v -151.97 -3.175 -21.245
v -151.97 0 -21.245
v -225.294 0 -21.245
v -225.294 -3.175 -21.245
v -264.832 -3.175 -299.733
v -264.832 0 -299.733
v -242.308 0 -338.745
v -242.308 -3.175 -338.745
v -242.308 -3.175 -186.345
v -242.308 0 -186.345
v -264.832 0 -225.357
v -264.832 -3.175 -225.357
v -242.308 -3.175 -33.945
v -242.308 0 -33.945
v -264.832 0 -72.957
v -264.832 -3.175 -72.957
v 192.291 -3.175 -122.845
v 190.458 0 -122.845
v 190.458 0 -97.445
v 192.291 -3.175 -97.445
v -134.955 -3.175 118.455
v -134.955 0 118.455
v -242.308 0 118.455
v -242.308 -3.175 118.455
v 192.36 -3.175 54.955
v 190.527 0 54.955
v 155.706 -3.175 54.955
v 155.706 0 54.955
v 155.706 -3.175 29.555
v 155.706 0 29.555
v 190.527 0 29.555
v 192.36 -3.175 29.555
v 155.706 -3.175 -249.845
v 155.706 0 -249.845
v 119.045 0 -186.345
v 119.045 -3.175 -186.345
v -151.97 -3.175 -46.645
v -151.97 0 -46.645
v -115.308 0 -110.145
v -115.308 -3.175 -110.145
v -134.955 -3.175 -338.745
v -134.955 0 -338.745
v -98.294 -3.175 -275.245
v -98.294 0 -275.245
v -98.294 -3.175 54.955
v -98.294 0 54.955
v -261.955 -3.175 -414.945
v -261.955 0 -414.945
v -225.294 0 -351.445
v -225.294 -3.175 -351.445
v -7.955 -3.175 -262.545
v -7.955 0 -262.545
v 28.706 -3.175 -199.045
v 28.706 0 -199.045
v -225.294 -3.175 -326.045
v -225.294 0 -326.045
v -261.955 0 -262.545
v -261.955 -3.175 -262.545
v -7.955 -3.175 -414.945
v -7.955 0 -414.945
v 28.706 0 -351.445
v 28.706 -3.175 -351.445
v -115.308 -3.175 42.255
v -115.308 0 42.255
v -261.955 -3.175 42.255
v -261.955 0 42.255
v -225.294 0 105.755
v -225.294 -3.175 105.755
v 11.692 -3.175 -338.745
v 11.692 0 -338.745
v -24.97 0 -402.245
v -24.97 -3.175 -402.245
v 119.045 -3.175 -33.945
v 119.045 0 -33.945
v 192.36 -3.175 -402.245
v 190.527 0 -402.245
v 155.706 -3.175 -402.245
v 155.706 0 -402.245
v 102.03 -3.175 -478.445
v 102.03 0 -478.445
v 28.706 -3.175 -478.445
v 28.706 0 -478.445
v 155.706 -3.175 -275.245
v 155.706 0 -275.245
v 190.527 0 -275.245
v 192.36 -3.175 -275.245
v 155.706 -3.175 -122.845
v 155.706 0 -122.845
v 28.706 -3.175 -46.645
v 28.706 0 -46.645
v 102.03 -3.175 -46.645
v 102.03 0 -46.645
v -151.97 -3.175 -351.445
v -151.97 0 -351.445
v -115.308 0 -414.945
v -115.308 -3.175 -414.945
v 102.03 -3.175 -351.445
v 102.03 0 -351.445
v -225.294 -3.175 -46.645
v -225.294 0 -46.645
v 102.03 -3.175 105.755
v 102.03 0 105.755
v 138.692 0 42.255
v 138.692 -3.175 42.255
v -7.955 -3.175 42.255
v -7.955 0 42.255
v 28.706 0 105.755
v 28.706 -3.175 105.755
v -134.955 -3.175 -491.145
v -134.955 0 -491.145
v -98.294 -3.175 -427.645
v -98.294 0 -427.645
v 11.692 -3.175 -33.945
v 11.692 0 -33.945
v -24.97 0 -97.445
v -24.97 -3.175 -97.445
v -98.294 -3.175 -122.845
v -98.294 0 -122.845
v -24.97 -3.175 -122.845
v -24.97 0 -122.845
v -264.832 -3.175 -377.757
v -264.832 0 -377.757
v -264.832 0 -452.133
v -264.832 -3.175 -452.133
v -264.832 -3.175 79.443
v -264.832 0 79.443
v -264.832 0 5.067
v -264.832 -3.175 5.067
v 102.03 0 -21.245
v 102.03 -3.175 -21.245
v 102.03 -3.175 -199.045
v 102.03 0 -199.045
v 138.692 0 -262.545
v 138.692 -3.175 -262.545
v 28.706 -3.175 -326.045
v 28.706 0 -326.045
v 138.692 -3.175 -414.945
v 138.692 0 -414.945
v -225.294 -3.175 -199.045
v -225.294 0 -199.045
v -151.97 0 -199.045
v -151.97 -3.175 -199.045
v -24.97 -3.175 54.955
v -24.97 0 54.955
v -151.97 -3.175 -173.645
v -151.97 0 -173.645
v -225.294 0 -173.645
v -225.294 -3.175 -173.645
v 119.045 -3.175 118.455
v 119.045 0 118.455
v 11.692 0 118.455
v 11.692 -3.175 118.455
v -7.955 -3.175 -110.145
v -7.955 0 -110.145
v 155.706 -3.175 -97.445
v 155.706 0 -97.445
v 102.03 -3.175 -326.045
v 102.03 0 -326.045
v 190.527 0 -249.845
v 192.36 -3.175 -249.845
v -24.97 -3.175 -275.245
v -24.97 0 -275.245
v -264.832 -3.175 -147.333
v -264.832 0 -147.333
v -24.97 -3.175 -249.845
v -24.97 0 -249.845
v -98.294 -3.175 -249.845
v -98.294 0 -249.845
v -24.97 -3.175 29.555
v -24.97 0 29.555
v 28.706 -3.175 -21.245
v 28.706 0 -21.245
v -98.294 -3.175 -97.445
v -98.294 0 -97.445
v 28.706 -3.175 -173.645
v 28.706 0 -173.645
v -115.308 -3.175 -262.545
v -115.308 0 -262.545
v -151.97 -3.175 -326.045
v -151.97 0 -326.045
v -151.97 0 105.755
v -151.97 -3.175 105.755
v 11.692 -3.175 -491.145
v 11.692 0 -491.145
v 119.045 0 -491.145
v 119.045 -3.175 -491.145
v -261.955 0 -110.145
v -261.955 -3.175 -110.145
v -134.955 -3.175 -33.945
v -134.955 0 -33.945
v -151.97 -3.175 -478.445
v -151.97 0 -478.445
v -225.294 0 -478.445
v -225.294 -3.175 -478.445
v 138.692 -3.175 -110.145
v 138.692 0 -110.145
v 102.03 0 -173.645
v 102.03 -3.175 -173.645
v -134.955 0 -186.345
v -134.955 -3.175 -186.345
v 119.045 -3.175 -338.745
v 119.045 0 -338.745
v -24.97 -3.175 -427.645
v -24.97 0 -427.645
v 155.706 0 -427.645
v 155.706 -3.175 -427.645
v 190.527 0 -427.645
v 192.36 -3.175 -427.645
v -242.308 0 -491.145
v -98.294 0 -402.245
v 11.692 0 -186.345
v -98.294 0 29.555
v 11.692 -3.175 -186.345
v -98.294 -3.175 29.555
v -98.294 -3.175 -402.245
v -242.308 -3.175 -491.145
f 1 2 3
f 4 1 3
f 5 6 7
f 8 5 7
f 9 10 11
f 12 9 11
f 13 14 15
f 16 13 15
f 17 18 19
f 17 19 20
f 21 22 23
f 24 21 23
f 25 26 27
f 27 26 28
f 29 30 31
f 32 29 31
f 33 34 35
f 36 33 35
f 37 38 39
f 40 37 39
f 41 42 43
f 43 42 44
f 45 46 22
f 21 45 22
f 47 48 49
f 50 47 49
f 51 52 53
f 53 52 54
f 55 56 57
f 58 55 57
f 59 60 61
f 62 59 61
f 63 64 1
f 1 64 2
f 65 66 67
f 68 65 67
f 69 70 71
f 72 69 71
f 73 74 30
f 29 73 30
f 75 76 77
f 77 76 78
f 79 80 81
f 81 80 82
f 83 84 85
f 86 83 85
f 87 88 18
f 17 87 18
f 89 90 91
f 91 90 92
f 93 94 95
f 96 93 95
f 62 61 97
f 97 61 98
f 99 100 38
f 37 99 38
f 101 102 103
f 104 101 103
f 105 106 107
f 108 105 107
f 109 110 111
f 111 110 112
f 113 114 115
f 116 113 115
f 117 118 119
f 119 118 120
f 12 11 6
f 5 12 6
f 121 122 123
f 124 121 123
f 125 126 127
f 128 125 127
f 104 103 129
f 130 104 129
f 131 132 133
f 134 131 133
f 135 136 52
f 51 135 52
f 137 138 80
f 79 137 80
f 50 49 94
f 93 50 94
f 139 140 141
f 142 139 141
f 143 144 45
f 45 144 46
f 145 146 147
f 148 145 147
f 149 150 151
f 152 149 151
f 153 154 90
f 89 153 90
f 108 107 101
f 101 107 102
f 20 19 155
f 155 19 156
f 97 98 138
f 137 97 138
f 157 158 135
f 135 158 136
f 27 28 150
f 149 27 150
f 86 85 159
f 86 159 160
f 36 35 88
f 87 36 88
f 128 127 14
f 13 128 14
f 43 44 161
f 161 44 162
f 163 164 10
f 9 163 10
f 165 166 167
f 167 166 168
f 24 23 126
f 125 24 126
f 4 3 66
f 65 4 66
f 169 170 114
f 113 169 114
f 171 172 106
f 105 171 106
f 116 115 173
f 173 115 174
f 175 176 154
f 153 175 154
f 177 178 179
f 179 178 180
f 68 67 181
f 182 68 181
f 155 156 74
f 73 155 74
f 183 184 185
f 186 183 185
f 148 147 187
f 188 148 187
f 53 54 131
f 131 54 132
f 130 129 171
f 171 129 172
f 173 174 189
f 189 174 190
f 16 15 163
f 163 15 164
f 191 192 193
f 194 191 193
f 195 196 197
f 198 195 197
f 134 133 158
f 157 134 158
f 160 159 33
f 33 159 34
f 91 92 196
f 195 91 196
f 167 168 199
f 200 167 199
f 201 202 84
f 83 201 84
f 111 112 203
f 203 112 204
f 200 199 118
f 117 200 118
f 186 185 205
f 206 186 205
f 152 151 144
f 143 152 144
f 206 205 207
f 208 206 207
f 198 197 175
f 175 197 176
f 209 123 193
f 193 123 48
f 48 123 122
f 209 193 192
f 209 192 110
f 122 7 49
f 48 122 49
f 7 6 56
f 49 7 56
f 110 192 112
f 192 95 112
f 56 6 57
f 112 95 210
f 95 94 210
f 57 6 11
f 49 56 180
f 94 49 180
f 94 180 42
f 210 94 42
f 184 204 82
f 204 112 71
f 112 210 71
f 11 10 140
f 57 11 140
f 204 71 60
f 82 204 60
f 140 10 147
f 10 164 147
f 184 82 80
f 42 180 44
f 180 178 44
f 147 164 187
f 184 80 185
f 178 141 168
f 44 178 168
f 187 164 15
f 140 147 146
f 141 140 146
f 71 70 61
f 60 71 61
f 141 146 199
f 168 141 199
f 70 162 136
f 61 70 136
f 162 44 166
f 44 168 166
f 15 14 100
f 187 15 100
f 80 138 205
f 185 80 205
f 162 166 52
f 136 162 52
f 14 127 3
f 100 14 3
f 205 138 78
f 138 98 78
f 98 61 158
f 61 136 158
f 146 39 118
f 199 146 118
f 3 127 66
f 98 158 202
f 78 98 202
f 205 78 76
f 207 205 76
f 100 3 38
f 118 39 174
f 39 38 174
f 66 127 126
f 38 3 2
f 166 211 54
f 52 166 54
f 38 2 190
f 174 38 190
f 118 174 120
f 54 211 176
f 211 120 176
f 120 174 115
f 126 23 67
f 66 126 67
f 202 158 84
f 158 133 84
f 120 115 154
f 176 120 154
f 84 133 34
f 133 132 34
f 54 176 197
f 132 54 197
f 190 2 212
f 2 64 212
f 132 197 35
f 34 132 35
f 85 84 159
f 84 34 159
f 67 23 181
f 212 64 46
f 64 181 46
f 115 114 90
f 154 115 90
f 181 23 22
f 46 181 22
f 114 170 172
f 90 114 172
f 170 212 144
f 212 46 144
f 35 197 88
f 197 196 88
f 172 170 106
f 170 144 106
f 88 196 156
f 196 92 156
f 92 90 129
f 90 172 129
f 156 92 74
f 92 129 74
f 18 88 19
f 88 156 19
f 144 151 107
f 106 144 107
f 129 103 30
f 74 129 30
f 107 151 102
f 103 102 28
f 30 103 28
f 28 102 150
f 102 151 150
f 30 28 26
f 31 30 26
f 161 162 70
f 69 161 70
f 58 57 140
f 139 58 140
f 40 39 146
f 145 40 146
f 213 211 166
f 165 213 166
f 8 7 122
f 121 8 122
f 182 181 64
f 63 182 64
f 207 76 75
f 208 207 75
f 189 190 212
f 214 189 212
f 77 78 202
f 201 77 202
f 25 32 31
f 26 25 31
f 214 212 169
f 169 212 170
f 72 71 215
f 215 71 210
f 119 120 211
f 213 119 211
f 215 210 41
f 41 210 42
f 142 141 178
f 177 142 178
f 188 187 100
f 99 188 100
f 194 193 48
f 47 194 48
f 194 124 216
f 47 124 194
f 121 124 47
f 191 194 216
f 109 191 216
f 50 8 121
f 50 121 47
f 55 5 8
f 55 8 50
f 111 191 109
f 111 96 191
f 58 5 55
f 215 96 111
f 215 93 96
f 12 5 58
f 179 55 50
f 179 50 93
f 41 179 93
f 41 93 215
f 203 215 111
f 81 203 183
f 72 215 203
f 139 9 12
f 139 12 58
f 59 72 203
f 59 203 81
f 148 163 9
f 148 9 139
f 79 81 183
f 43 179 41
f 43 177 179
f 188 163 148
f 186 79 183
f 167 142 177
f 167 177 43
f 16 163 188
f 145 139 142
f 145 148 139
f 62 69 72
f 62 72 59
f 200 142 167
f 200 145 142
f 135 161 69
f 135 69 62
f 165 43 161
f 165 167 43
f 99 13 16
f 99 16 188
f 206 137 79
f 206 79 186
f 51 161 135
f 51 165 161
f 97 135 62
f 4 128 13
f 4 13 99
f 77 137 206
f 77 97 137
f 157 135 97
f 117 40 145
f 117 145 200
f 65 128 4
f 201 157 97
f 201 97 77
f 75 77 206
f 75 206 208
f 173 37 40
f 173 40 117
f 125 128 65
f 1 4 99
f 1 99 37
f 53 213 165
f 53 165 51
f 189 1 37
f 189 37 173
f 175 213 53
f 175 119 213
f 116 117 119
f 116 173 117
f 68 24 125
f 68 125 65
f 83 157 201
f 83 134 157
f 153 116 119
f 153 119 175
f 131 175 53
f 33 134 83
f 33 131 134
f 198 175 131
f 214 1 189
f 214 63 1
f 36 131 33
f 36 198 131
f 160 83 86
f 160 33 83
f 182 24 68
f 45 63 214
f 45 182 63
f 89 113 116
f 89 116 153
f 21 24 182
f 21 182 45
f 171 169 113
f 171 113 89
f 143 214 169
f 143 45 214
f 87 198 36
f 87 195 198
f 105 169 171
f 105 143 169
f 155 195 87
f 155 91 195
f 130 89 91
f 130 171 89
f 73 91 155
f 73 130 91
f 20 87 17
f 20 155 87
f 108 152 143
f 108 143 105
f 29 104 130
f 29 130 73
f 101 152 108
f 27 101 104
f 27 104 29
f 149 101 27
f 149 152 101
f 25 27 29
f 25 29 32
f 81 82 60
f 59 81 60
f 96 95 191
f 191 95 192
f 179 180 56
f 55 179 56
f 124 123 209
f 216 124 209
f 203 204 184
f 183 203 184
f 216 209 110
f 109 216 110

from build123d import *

# Parameters (mm, degrees)
F1_DEPTH    = 3.175
F2_T1_DEPTH = 41.9033921872
F3_T1_DEPTH = 42.5180012054
F4_T1_DEPTH = 41.9033921872
F5_T1_DEPTH = 41.9033921872


# Not quite as in the source:
# - a fillet or chamfer that OpenCascade refuses, or shapes differently, is made with other operations: its cross-section is extruded or revolved along the edge and cut away or added
# - ends of sketch curves that miss each other by under 0.0002 mm in the source are joined


with BuildPart() as f1:
    # F0 (on Front) → F1 (new body)
    with BuildSketch(Plane.XZ):
        Polygon((-134.9552678654, 118.4551059571), (-242.3083075974, 118.4551059571), (-264.8317917845, 79.4432945156), (-264.8317917845, 5.0669305831), (-242.3083075974, -33.9448883924), (-264.8317917845, -72.9567073679), (-264.8317917845, -147.3330713004), (-242.3083075974, -186.3448902759), (-264.8317917845, -225.3567092514), (-264.8317917845, -299.7330731839), (-242.3083075974, -338.7448921594), (-264.8317917845, -377.7567111349), (-264.8317917845, -452.1330750674), (-242.3083075974, -491.1448940429), (-134.9552678654, -491.1448940429), (-98.2935257718, -427.6448940429), (-24.9700415847, -427.6448940429), (11.6917005088, -491.1448940429), (119.0447402409, -491.1448940429), (155.7064823344, -427.6448940429), (192.3682082155, -427.6448940429), (192.3682082155, -402.2448921594), (155.7064823344, -402.2448921594), (119.0447402409, -338.7448921594), (155.7064823344, -275.2448921594), (192.3682082155, -275.2448921594), (192.3682082155, -249.8448902759), (155.7064823344, -249.8448902759), (119.0447402409, -186.3448902759), (155.7064823344, -122.8448902759), (192.3682082155, -122.8448902759), (192.3682082155, -97.4448883924), (155.7064823344, -97.4448883924), (119.0447402409, -33.9448883924), (155.7064823344, 29.5551116076), (192.3682082155, 29.5551116076), (192.3682082155, 54.9551134911), (155.7064823344, 54.9551134911), (119.0447402409, 118.4551134911), (11.6917005088, 118.4551059571), (-24.9700415847, 54.9551134911), (-98.2935257718, 54.9551134911), align=None)
        Polygon((-261.9552759716, -414.9448940429), (-225.2935338781, -351.4448940429), (-151.970049691, -351.4448940429), (-115.3083075974, -414.9448940429), (-151.970049691, -478.4448940429), (-225.2935338781, -478.4448940429), align=None, mode=Mode.SUBTRACT)
        Polygon((11.6917005088, -338.7448921594), (-24.9700415847, -402.2448921594), (-98.2935257718, -402.2448921594), (-134.9552678654, -338.7448921594), (-98.2935257718, -275.2448921594), (-24.9700415847, -275.2448921594), align=None, mode=Mode.SUBTRACT)
        Polygon((-115.3083075974, -262.5448921594), (-151.970049691, -326.0448921594), (-225.2935338781, -326.0448921594), (-261.9552759716, -262.5448921594), (-225.2935338781, -199.0448921594), (-151.970049691, -199.0448921594), align=None, mode=Mode.SUBTRACT)
        Polygon((138.6917005088, -414.9448940429), (102.0299584153, -478.4448940429), (28.7064742282, -478.4448940429), (-7.9552678654, -414.9448940429), (28.7064742282, -351.4448940429), (102.0299584153, -351.4448940429), align=None, mode=Mode.SUBTRACT)
        Polygon((138.6917005088, -262.5448921594), (102.0299584153, -326.0448921594), (28.7064742282, -326.0448921594), (-7.9552678654, -262.5448921594), (28.7064742282, -199.0448921594), (102.0299584153, -199.0448921594), align=None, mode=Mode.SUBTRACT)
        Polygon((-115.3083075974, -110.1448902759), (-151.970049691, -173.6448902759), (-225.2935338781, -173.6448902759), (-261.9552759716, -110.1448902759), (-225.2935338781, -46.6448902759), (-151.970049691, -46.6448902759), align=None, mode=Mode.SUBTRACT)
        Polygon((11.6917005088, -186.3448902759), (-24.9700415847, -249.8448902759), (-98.2935257718, -249.8448902759), (-134.9552678654, -186.3448902759), (-98.2935257718, -122.8448902759), (-24.9700415847, -122.8448902759), align=None, mode=Mode.SUBTRACT)
        Polygon((11.6917005088, -33.9448883924), (-24.9700415847, -97.4448883924), (-98.2935257718, -97.4448883924), (-134.9552678654, -33.9448883924), (-98.2935257718, 29.5551116076), (-24.9700415847, 29.5551116076), align=None, mode=Mode.SUBTRACT)
        Polygon((-115.3083075974, 42.2551116076), (-151.970049691, -21.2448883924), (-225.2935338781, -21.2448883924), (-261.9552759716, 42.2551116076), (-225.2935338781, 105.7551116076), (-151.970049691, 105.7551116076), align=None, mode=Mode.SUBTRACT)
        Polygon((138.6917005088, -110.1448902759), (102.0299584153, -173.6448902759), (28.7064742282, -173.6448902759), (-7.9552678654, -110.1448902759), (28.7064742282, -46.6448902759), (102.0299584153, -46.6448902759), align=None, mode=Mode.SUBTRACT)
        Polygon((138.6917005088, 42.2551116076), (102.0299584153, -21.2448883924), (28.7064742282, -21.2448883924), (-7.9552678654, 42.2551116076), (28.7064742282, 105.7551116076), (102.0299584153, 105.7551116076), align=None, mode=Mode.SUBTRACT)
    extrude(amount=F1_DEPTH)

    # F2: chamfer of 1.8415 x 3.1895715621 on 1 edges, made by hand

    # F2_s2 → F2_t1 (cut)
    with BuildSketch(Plane.XY.offset(21.3034164558)):
        Polygon((192.3682082155, -3.1895715621), (190.5267082155, 0), (192.3682082155, 0), align=None)
    extrude(amount=F2_T1_DEPTH, mode=Mode.SUBTRACT)

    # F3: chamfer of 1.91008 x 3.3083556065 on 1 edges, made by hand

    # F3_s2 → F3_t1 (cut)
    with BuildSketch(Plane.XY.offset(-131.4038899368)):
        Polygon((190.4581282155, 0), (192.3682082155, -3.3083556065), (192.3682082155, 0), align=None)
    extrude(amount=F3_T1_DEPTH, mode=Mode.SUBTRACT)

    # F4: chamfer of 1.8415 x 3.1895715621 on 1 edges, made by hand

    # F4_s2 → F4_t1 (cut)
    with BuildSketch(Plane.XY.offset(-283.4965873112)):
        Polygon((190.5267082155, 0), (192.3682082155, -3.1895715621), (192.3682082155, 0), align=None)
    extrude(amount=F4_T1_DEPTH, mode=Mode.SUBTRACT)

    # F5: chamfer of 1.8415 x 3.1895715621 on 1 edges, made by hand

    # F5_s2 → F5_t1 (cut)
    with BuildSketch(Plane.XY.offset(-435.8965891948)):
        Polygon((190.5267082155, 0), (192.3682082155, -3.1895715621), (192.3682082155, 0), align=None)
    extrude(amount=F5_T1_DEPTH, mode=Mode.SUBTRACT)


solid = f1.part
